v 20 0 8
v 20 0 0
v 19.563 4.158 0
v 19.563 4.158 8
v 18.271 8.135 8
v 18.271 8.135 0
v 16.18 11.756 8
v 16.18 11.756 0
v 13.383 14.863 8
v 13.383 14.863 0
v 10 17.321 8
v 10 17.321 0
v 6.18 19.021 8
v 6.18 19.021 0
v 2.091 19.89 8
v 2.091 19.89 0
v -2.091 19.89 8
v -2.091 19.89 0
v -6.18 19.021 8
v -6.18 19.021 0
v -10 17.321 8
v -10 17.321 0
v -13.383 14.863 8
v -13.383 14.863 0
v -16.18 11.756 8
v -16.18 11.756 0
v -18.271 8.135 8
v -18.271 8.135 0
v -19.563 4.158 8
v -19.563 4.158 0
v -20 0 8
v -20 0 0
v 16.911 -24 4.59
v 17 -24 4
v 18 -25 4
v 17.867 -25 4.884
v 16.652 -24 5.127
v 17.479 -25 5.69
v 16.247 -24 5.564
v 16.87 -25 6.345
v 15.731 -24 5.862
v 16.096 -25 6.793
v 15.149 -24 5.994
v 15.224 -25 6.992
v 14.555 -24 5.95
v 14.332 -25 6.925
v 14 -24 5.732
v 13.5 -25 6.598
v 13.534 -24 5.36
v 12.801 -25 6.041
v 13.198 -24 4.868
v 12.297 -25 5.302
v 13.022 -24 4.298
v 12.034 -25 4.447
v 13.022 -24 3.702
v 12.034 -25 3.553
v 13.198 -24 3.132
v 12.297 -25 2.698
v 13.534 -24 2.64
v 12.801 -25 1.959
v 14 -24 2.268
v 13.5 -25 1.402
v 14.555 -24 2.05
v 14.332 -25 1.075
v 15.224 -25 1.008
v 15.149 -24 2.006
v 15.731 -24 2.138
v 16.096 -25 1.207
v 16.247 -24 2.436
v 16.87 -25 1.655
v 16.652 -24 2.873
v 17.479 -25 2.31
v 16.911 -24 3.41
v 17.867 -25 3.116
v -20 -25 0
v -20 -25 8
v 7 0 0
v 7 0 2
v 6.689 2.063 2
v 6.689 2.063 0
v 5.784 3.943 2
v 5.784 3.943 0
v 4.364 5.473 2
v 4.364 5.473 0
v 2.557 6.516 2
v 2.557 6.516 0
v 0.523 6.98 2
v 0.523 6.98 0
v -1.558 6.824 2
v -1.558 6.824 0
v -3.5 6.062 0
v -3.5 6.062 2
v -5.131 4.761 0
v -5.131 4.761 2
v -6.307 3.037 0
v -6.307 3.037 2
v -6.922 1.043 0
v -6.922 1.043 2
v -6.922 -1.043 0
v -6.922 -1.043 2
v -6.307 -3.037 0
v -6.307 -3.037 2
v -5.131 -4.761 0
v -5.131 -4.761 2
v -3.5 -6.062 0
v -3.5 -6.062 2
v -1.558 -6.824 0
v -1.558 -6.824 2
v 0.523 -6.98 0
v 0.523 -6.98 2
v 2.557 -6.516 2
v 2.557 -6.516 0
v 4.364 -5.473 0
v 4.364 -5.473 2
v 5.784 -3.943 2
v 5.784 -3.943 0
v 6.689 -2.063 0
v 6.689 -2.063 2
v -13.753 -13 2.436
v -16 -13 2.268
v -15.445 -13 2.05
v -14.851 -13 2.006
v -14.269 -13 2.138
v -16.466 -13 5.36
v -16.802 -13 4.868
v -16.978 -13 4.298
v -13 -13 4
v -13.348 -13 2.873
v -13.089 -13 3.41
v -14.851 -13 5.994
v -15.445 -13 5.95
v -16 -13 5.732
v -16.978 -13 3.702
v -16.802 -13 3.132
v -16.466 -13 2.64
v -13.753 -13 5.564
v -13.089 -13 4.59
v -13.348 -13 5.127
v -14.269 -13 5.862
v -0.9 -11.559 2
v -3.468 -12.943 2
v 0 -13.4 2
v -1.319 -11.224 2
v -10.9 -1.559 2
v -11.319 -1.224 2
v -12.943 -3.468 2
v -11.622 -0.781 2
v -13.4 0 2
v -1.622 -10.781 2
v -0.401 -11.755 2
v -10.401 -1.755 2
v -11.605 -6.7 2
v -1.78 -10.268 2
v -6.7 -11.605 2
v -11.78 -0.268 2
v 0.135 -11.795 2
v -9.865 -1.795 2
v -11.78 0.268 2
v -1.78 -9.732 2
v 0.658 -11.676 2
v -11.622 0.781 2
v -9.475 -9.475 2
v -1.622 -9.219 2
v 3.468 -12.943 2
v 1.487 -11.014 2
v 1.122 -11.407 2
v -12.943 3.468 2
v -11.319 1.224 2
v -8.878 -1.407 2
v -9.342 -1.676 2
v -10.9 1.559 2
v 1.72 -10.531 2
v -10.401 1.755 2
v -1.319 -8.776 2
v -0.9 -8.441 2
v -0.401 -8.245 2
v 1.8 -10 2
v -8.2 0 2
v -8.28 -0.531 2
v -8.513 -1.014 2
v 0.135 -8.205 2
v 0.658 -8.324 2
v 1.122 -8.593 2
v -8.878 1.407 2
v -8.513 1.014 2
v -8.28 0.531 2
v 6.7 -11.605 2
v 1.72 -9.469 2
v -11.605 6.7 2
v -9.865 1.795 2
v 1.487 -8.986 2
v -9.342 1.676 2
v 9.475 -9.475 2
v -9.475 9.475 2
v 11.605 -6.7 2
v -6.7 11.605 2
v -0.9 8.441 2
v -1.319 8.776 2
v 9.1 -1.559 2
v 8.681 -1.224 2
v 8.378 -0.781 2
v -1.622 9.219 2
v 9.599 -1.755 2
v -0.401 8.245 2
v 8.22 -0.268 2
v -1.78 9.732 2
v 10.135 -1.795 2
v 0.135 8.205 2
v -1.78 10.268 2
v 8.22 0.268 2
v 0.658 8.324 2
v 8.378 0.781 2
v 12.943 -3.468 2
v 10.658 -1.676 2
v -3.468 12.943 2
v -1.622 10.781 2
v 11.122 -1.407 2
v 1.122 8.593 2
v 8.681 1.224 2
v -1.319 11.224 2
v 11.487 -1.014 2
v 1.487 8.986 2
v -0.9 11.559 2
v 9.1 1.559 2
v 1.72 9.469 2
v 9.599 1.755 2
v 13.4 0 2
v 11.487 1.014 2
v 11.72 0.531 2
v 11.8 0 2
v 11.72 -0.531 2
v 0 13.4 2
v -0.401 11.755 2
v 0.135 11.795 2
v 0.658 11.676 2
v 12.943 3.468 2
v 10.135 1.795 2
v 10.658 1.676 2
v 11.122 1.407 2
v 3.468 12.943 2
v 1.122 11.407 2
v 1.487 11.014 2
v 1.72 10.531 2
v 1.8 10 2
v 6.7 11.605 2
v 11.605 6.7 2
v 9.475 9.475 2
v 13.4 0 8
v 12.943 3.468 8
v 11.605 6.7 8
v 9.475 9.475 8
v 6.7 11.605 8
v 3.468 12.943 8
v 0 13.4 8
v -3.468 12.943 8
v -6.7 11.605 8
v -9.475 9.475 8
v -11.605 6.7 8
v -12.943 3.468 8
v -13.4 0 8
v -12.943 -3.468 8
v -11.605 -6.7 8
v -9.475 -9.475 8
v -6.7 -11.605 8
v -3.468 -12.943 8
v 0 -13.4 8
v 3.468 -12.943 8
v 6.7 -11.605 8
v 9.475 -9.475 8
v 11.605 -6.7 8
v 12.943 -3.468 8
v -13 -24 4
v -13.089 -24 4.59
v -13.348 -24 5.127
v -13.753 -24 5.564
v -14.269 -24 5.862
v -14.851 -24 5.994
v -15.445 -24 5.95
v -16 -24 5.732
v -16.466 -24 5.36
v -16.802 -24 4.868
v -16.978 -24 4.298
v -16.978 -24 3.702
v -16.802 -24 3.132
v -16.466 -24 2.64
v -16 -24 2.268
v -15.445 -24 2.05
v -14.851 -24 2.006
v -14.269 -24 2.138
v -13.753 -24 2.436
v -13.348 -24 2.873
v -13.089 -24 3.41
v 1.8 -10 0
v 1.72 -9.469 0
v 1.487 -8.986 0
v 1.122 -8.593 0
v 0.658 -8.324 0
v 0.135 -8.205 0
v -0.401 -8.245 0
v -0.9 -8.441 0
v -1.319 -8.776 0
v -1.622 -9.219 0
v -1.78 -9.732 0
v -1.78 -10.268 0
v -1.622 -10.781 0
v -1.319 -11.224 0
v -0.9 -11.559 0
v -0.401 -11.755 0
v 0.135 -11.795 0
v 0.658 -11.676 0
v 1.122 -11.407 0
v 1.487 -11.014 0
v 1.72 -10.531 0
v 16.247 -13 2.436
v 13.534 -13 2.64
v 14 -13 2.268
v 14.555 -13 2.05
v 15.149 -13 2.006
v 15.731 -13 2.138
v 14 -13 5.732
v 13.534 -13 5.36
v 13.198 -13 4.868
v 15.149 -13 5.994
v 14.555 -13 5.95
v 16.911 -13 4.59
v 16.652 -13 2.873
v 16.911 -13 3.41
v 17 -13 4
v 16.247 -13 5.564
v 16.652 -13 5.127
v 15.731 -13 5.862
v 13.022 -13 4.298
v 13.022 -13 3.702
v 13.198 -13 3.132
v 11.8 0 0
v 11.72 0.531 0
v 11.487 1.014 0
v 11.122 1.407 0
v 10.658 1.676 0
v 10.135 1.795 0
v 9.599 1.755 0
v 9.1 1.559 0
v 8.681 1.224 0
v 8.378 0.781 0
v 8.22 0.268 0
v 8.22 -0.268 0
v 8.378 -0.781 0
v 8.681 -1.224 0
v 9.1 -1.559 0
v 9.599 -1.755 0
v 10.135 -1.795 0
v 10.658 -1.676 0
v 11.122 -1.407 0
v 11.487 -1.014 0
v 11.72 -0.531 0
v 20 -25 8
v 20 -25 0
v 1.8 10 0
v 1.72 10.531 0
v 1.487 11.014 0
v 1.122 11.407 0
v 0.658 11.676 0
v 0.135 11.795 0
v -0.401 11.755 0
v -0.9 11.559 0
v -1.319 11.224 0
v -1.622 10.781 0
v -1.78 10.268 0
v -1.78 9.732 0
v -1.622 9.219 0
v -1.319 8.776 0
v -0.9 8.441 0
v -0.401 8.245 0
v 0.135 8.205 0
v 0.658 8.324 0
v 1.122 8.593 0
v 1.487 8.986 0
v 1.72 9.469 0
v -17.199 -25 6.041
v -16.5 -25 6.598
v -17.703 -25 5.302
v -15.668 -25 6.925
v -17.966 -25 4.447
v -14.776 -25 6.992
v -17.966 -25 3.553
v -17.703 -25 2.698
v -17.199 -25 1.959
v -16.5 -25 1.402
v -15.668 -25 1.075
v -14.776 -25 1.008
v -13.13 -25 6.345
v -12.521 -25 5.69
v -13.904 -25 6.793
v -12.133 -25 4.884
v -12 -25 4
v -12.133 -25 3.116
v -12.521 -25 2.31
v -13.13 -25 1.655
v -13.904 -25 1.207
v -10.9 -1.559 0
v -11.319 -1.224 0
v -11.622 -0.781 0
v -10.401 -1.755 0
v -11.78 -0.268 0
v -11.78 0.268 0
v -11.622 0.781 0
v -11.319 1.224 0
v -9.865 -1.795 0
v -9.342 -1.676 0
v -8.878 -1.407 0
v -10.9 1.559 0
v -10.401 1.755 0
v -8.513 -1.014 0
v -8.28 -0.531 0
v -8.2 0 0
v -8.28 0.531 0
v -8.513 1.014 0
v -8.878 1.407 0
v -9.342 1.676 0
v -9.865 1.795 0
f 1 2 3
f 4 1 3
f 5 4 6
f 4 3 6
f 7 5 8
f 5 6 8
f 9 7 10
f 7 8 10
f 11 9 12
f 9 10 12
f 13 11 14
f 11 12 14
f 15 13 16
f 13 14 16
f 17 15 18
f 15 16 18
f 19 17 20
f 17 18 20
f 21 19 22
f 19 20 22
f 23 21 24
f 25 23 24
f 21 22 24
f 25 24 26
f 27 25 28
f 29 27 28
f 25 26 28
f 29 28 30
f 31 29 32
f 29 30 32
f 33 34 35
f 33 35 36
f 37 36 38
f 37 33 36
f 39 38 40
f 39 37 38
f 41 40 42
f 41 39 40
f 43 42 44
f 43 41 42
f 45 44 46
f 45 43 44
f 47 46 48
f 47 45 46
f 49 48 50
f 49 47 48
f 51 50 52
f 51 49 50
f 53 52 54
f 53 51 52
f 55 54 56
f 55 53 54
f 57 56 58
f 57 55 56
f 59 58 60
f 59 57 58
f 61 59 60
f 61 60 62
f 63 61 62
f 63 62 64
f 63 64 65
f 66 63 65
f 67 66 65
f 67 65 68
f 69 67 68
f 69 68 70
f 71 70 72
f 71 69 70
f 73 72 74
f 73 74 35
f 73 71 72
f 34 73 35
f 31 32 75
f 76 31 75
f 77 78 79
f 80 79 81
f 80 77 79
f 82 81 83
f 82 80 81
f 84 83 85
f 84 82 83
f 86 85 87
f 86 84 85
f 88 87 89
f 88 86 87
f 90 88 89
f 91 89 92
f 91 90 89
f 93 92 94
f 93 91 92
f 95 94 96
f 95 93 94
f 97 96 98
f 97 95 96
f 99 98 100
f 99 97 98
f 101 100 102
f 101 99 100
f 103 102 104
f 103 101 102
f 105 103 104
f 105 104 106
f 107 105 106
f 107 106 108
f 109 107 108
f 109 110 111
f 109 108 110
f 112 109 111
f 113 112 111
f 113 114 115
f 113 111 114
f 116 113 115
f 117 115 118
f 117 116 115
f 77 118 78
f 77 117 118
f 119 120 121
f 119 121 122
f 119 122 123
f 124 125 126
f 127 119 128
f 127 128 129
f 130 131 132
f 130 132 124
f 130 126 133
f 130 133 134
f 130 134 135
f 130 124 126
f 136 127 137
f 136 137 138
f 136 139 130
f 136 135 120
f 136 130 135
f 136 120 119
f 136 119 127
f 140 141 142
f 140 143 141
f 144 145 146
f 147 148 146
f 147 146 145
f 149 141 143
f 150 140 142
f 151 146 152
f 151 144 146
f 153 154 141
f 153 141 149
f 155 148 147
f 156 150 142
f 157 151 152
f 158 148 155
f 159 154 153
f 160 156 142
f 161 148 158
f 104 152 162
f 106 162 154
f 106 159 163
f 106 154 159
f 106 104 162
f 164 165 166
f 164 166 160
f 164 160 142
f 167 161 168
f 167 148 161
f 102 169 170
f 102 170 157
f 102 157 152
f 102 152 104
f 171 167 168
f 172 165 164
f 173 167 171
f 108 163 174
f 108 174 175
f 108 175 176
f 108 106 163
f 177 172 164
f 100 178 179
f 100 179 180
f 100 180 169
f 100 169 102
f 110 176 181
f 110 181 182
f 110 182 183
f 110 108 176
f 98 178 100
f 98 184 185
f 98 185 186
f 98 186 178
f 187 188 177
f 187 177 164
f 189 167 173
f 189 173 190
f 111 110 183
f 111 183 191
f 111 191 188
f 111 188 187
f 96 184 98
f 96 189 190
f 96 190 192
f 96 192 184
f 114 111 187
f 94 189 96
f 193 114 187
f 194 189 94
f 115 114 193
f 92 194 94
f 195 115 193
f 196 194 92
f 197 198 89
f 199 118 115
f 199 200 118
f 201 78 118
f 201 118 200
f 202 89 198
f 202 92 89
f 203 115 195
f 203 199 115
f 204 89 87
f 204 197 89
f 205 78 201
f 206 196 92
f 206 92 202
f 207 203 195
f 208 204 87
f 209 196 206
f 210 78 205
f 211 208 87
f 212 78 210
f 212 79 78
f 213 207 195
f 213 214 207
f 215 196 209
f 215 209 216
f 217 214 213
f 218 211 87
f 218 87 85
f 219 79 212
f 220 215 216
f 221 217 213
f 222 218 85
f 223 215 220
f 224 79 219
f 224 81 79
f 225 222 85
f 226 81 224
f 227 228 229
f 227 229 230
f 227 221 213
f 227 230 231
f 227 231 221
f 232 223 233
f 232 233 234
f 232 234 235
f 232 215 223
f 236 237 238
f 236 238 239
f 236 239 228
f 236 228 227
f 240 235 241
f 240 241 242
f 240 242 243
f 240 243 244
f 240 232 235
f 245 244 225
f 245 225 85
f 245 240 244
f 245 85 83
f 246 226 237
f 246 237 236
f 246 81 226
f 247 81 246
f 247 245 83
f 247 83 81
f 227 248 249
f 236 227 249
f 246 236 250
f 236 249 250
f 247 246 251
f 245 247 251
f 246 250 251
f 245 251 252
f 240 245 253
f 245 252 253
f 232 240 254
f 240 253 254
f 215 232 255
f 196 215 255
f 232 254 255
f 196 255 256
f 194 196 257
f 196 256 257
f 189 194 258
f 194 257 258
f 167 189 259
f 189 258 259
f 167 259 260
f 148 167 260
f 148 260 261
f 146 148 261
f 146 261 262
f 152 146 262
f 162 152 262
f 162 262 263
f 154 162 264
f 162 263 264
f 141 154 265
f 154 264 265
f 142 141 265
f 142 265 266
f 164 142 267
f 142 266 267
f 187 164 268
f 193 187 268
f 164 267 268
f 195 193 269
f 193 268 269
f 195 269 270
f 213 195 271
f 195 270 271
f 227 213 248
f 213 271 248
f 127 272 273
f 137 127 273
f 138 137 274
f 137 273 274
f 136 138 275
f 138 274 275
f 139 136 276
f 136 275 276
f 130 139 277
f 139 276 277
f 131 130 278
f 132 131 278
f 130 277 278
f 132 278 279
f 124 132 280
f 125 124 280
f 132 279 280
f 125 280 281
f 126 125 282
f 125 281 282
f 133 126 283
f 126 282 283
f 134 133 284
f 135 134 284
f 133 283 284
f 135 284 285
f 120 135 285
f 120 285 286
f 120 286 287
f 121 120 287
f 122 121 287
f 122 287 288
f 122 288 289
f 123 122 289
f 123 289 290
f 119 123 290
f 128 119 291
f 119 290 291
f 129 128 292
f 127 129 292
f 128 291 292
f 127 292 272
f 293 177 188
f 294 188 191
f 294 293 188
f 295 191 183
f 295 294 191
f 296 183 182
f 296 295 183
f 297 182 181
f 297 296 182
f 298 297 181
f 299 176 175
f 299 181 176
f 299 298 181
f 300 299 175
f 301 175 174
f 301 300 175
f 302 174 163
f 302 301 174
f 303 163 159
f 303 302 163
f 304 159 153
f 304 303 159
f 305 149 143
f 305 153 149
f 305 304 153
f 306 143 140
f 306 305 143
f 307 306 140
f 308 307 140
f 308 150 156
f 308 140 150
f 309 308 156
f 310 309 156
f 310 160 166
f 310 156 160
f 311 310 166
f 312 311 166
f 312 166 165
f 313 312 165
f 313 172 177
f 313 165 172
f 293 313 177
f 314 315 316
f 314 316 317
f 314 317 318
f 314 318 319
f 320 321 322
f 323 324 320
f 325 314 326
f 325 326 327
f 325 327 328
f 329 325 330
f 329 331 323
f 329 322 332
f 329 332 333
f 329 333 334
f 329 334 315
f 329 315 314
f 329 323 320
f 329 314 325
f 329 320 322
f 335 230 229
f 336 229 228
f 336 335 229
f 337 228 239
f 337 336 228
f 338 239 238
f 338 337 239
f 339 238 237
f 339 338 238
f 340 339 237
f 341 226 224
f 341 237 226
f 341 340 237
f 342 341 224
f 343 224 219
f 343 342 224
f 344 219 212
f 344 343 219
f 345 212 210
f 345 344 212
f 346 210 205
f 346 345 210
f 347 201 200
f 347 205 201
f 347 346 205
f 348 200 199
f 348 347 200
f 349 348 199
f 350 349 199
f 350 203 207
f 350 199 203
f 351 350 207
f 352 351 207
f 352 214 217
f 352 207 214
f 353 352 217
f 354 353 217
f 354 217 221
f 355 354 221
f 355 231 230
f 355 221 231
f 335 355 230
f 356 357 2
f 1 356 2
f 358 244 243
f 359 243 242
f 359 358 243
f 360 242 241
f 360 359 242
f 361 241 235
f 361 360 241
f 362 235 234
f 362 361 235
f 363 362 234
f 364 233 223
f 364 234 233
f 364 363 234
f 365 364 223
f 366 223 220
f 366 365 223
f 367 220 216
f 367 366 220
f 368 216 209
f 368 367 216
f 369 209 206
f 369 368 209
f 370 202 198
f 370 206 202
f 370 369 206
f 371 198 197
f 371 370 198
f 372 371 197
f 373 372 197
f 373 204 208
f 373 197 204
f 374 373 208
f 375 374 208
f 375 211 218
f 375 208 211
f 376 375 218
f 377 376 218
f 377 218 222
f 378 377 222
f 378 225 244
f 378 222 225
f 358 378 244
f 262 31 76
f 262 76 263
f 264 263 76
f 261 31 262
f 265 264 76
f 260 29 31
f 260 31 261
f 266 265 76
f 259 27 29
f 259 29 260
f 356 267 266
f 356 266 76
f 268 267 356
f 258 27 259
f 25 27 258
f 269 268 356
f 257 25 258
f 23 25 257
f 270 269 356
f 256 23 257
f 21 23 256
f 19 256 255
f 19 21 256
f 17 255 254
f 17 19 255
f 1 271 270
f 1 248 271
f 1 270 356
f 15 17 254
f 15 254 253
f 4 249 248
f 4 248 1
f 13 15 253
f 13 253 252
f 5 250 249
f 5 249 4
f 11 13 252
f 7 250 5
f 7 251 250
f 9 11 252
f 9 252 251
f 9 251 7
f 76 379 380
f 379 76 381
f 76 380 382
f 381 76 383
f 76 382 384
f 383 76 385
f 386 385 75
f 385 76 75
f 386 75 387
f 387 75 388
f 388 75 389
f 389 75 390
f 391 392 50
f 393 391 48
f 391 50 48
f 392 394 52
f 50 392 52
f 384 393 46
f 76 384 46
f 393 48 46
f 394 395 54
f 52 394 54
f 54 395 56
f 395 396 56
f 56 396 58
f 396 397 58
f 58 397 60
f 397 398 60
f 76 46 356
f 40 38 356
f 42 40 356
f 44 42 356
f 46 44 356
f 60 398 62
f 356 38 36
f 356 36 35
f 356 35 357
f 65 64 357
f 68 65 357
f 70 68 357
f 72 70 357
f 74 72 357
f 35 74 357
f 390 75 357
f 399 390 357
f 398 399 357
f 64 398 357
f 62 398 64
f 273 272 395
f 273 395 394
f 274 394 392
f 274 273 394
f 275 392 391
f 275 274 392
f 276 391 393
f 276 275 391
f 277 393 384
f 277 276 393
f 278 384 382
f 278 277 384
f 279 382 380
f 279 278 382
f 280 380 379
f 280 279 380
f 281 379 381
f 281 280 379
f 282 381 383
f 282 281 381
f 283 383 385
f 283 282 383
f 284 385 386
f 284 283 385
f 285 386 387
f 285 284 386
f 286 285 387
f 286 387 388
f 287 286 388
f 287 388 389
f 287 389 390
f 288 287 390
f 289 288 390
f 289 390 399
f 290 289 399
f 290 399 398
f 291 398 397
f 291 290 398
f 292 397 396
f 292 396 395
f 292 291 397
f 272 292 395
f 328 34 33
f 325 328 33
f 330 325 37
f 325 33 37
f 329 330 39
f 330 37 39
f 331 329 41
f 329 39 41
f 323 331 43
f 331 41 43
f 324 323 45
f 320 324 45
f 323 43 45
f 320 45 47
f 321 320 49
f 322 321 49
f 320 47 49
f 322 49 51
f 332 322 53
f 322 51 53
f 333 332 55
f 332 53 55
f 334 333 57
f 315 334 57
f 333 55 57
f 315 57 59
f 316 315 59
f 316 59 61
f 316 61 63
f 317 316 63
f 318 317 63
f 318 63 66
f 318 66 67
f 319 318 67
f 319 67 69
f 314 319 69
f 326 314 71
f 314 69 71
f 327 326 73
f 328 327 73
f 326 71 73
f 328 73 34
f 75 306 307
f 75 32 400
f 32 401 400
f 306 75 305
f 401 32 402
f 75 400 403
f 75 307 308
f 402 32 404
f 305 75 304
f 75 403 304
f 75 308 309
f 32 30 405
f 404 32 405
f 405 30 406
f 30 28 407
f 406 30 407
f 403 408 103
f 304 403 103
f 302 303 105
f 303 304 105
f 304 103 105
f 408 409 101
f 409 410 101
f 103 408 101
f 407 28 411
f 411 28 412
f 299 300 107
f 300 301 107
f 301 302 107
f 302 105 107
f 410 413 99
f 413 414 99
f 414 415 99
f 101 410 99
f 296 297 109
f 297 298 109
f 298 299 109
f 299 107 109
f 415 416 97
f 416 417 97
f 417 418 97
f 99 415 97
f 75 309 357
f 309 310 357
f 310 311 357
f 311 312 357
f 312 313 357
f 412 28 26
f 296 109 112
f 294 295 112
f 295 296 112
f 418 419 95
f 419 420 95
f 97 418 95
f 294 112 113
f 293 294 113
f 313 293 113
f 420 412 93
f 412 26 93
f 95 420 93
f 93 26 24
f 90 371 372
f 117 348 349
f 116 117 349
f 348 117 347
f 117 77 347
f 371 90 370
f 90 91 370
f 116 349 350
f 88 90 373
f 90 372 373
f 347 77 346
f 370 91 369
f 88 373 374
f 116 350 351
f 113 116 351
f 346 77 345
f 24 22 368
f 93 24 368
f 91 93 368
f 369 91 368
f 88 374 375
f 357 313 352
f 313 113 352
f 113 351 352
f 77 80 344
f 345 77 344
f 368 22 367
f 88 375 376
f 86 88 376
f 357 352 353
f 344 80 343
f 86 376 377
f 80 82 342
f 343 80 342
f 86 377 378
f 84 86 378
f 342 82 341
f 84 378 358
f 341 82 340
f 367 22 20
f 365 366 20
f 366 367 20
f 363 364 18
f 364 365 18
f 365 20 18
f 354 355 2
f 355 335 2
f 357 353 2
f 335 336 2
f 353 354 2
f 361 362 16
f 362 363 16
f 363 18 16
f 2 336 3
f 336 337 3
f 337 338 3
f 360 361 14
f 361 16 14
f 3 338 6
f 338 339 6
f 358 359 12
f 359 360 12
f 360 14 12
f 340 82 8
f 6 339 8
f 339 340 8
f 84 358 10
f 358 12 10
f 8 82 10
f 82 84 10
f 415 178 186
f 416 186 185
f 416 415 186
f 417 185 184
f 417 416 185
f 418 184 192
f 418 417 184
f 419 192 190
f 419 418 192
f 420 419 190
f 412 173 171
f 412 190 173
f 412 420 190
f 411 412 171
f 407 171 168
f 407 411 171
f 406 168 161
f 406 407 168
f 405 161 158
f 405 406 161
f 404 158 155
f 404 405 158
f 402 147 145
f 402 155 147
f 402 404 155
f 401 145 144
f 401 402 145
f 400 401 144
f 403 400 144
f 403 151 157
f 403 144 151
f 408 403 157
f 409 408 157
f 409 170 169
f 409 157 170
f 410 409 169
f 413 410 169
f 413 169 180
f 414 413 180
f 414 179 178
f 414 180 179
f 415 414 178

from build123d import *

# Parameters (mm, degrees)
ESQUISSE1_R             = 7
ESQUISSE1_R_2           = 1.8
BOSS_EXTRU_1_DEPTH      = 8
ESQUISSE2_R             = 13.4
ENL_V_MAT_EXTRU_1_DEPTH = 6
ESQUISSE3_R             = 2
ENL_V_MAT_EXTRU_2_DEPTH = 12
CHANFREIN1_SIZE         = 1


with BuildPart() as part:
    # Esquisse1 → Boss.-Extru.1 (new body)
    with BuildSketch(Plane.XY):
        with BuildLine():
            Line((-20, 0), (-20, -25))
            Line((-20, -25), (20, -25))
            Line((20, -25), (20, 0))
            ThreePointArc((20, 0), (0, 20), (-20, 0))
        make_face()
        Circle(ESQUISSE1_R, mode=Mode.SUBTRACT)
        with Locations((0, 10)):
            Circle(ESQUISSE1_R_2, mode=Mode.SUBTRACT)
        with Locations((10, 0)):
            Circle(ESQUISSE1_R_2, mode=Mode.SUBTRACT)
        with Locations((0, -10)):
            Circle(ESQUISSE1_R_2, mode=Mode.SUBTRACT)
        with Locations((-10, 0)):
            Circle(ESQUISSE1_R_2, mode=Mode.SUBTRACT)
    extrude(amount=BOSS_EXTRU_1_DEPTH)

    # Esquisse2 → Enlèv. mat.-Extru.1 (cut)
    with BuildSketch(Plane.XY.offset(8)):
        Circle(ESQUISSE2_R)
    extrude(amount=-ENL_V_MAT_EXTRU_1_DEPTH, mode=Mode.SUBTRACT)

    # Esquisse3 → Enlèv. mat.-Extru.2 (cut)
    with BuildSketch(Plane.XZ.offset(25)):
        with Locations((-15, 4)):
            Circle(ESQUISSE3_R)
        with Locations((15, 4)):
            Circle(ESQUISSE3_R)
    extrude(amount=-ENL_V_MAT_EXTRU_2_DEPTH, mode=Mode.SUBTRACT)

    # Chanfrein1
    chanfrein1_edges = [part.edges().sort_by_distance(p)[0] for p in [
        (-17, -25, 4),
        (13, -25, 4),
    ]]
    chamfer(chanfrein1_edges, length=CHANFREIN1_SIZE)


solid = part.part
